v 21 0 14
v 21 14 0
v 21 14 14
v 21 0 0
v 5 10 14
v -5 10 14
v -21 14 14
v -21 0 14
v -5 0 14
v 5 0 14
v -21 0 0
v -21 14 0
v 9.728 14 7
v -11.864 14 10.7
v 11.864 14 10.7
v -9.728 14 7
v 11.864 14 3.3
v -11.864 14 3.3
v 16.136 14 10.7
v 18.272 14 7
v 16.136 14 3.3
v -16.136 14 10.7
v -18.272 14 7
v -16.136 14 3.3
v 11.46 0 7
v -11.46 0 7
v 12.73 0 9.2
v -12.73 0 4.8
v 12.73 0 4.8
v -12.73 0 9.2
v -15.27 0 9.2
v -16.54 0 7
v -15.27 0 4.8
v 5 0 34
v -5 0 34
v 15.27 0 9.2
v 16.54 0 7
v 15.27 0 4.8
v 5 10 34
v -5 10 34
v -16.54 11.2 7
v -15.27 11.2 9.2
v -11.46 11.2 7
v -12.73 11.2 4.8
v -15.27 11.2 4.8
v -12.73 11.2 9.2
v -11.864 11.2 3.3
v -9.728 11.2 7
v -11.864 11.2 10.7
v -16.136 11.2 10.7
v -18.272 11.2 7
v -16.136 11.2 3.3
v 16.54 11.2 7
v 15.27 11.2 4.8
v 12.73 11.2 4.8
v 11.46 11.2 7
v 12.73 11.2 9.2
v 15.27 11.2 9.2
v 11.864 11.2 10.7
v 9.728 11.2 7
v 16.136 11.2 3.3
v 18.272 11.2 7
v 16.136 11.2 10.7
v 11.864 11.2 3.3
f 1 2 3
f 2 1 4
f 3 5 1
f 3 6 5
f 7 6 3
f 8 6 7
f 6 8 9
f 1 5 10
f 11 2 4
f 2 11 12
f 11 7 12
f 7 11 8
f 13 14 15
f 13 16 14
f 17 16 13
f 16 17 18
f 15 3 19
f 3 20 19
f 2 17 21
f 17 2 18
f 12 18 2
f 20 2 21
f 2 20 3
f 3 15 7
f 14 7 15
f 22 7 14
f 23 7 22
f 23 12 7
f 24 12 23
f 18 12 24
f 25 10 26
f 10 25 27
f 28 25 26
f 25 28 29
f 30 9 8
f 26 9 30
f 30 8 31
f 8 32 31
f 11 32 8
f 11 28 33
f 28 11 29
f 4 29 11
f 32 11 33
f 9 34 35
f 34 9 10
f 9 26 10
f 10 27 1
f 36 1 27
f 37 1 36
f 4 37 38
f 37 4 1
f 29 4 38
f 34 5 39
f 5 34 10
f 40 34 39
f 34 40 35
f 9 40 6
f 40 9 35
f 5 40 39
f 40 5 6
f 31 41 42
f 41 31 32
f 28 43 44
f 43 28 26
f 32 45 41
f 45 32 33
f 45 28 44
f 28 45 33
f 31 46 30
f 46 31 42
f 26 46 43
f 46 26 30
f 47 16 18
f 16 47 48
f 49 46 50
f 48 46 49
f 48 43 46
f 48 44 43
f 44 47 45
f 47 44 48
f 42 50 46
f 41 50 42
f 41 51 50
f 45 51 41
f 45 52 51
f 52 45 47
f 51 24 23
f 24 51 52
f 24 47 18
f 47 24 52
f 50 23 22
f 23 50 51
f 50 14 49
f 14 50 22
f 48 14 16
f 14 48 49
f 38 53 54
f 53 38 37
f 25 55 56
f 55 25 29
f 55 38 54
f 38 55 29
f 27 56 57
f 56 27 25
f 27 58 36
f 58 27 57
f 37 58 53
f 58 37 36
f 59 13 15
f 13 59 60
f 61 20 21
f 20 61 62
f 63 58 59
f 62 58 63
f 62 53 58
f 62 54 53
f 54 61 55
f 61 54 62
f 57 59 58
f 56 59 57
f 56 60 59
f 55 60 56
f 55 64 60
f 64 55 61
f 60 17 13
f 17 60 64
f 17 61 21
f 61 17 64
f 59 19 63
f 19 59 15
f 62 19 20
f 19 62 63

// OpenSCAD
// file: ../../../modules/steel_rack.scad
use <bolts.scad>;

bolt_edge_offset = 15;
bolt_positions = [
  bolt_edge_offset,
  bolt_edge_offset + 98,
  bolt_edge_offset + 98 + 24,
];

module bolt_and_nut(y, h) {
  nut_thickness = 5;
  translate([0, y, h / 2])
    m6_bolt_hole(h + 1, center = true);
  translate([0, y, h - nut_thickness / 2])
    rotate([0, 0, 90])
    m6_nut_trap(nut_thickness, center = true);
}

module long_bar(w, y, h) {
  difference() {
    translate([w / 2, y / 2, h / 2])
      cube([w, y, h], center = true);

    for (x = bolt_positions) {
      translate([x, 0, 0])
        bolt_and_nut(y / 2, h);
    }
  }
}

module short_bar(w, y, h) {
  difference() {
    translate([w / 2, y / 2, h / 2])
      cube([w, y, h], center = true);

    translate([bolt_positions[0], 0, 0])
      bolt_and_nut(y / 2, h);
  }
}

module fillet_profile(r, h) {
  linear_extrude(height = h, center = true)
    difference() {
      square([r, r]);
      circle(r = r, $fn = 64);
    }
}
// file: ../../../modules/bolts.scad
module nut_trap(d, h, center = true) {
  linear_extrude(height = h, center = center)
  circle(d = d / cos(30), $fn = 6);
}

module bolt_hole(d, h, center = true) {
  linear_extrude(height = h, center = center)
  circle(d = d, $fn = 64);
}

// Hex holes for self-tapping (nominal - 0.2mm)
module hex_hole(flat_d, h) {
  linear_extrude(height = h, center = true)
  circle(d = flat_d / cos(30), $fn = 6);
}

module m3_bolt_hexhole(h) {
  rotate([0, 0, 90]) hex_hole(flat_d = 2.8, h = h);
}

module m4_bolt_hexhole(h) {
  rotate([0, 0, 90]) hex_hole(flat_d = 3.8, h = h);
}

module m6_bolt_hexhole(h) {
  rotate([0, 0, 90]) hex_hole(flat_d = 5.8, h = h);
}

module m8_bolt_hexhole(h) {
  rotate([0, 0, 90]) hex_hole(flat_d = 7.8, h = h);
}

// M3
module m3_bolt_hole(h, center = false) { bolt_hole(d = 3.4, h = h, center = center); }
module m3_nut_trap(h, center = false) { nut_trap(d = 5.7, h = h, center = center); }

// M4
module m4_bolt_hole(h, center = false) { bolt_hole(d = 4.4, h = h, center = center); }
module m4_nut_trap(h, center = false) { nut_trap(d = 7.5, h = h, center = center); }

// M6
module m6_bolt_hole(h, center = false) { bolt_hole(d = 6.2, h = h, center = center); }
module m6_nut_trap(h, center = false) { nut_trap(d = 10.2, h = h, center = center); }

// M8
module m8_bolt_hole(h, center = false) { bolt_hole(d = 8.4, h = h, center = center); }
module m8_nut_trap(h, center = false) { nut_trap(d = 13.3, h = h, center = center); }
// file: ../../../modules/slide_rail_outer_bracket.scad
use <bolts.scad>
use <steel_rack.scad>

// スライドレール外側とL字アングルを接合するL字ブラケット。
// 設計の経緯と確定値は ledger/designs/steel-rack-500x400.md が正本。
//
// 座標系 (部品自身の datum):
//   X = 0 がこの部品側のL字アングル外側面。部品はアングル板厚の内側から始まる
//   Y = 0 がスライドレール外側面。+Y がラック外側
//   Z = 0 が部品底面 (レール下端と一致)
// front は screw_x = [37, 101.5]、rear は [79.5, 176] を自分の datum
// から渡す。 M6 が高さ 22.5±12 の対称配置のため部品は Z 反転対称になり、
// 左右のレールにも上下反転するだけで同じ2部品を使い回せる。

bracket_height = 45;
flange_t = 10; // 短辺 (X方向厚) の厚さ
// 長辺 (Y方向厚) の厚さ。旧断面は flange_t=10 を共用していたが、レール面を
// rail_offset 分外へ出すと M6 ナット挿入口が長辺と重なるため 2mm 削った
// (10→8、user決定)。ナット六角の内縁 (y=8.000) と長辺外面がツライチになる
arm_t = 8;
// レール接触面のラック外側オフセット。組付け実測でレール間隔が 385mm しか
// なくケース 412mm が入らないため、(412 - 385) / 2 + 0.5 = 14mm ずつ
// 各レールを外側へ移す (user指示)。M6 実穴は既に開いており位置を変えられない
rail_offset = 14;
inner_r = 4;
m6_z = [ 10.5, 34.5 ];
// クリアランス基準: 呼び寸法 + 0.4mm (実プリントの嵌合結果から拡大)
m6_pass_flat = 6.4; // M6ボルト通し六角の二面幅 (手前5mm)
m6_nut_flat = 10.4; // M6ナット窪み六角の二面幅 (奥5mm、ナット実測9.8 + 実効0.6)
m6_stage_depth = 5;
screw_z = 22.5;
m4_pass_flat = 4.4; // M4小トラスネジ通し六角の二面幅
m4_nut_flat = 7.4; // M4ナット窪み六角の二面幅 (ナット実測6.8 + 実効0.6)
m4_nut_depth = 2.8; // M4ナット窪みの深さ (user指定)
edge_margin = 8; // 穴の外縁から部品端までの余白 (自由な辺のみ)
angle_t = 2.2; // L字アングルの板厚

// 六角プリズム: 軸X・上下の辺が水平 (flat-up)。
// 天井を短い水平ブリッジにして垂れの改善を狙う
// (point-up だと天井面が水平から30°になり垂れた — 嵌合試験で確認済み)
module
hex_x_flat_up(flat_d, l)
{
    rotate([ 0, 90, 0 ]) rotate([ 0, 0, 90 ]) hex_hole(flat_d = flat_d, h = l);
}

// 六角プリズム: 軸Y・上下の辺が水平 (flat-up)。M6と同じくブリッジ天井
module
hex_y_flat_up(flat_d, l)
{
    rotate([ 90, 0, 0 ]) hex_hole(flat_d = flat_d, h = l);
}

module
slide_rail_outer_bracket(screw_x, name = "bracket")
{
    // flat-up配置では水平方向の穴半径は対角/2 (= 二面幅/(2*cos30))。
    // 8mm余白の契約はこの実半径に対して守る
    m6_nut_diag = m6_nut_flat / cos(30);
    m4_nut_diag = m4_nut_flat / cos(30);
    // M6中心: 実物のアングルには旧断面 (長辺厚10) の導出値
    // (厚10 + 内側R + 余白 + M6六角対角/2 = 28.0044) で既に穴が開いている。
    // 旧導出式から rail_offset を引くことで M6 実穴と部品外端の絶対位置を
    // 保ったまま、レール接触面 (y=0) だけをラック外側へ 14mm 出す
    m6_y = flange_t + inner_r + edge_margin + m6_nut_diag / 2 - rail_offset;
    short_len = m6_y + m6_nut_diag / 2 + edge_margin;
    // 長辺のX終端: 最奥のM4穴の最大断面 (ナット窪みの対角の半分) + 余白
    arm_end = max(screw_x) + m4_nut_diag / 2 + edge_margin;

    echo(str("CONTRACT ", name, ": height = ", bracket_height));
    echo(str("CONTRACT ", name, ": flange_t = ", flange_t));
    echo(str("CONTRACT ", name, ": arm_t = ", arm_t));
    echo(str("CONTRACT ", name, ": rail_offset = ", rail_offset));
    echo(str("CONTRACT ", name, ": inner_r = ", inner_r));
    echo(str("CONTRACT ", name, ": m6_z = ", m6_z));
    echo(str("CONTRACT ", name, ": m6_pass_flat = ", m6_pass_flat));
    echo(str("CONTRACT ", name, ": m6_nut_flat = ", m6_nut_flat));
    echo(str("CONTRACT ", name, ": screw_z = ", screw_z));
    echo(str("CONTRACT ", name, ": m4_pass_flat = ", m4_pass_flat));
    echo(str("CONTRACT ", name, ": m4_nut_flat = ", m4_nut_flat));
    echo(str("CONTRACT ", name, ": m4_nut_depth = ", m4_nut_depth));
    echo(str("CONTRACT ", name, ": edge_margin = ", edge_margin));
    echo(str("CONTRACT ", name, ": angle_t = ", angle_t));
    echo(str("CONTRACT ", name, ": screw_x = ", screw_x));
    echo(str("CONTRACT ",
             name,
             ": m6_y = ",
             m6_y,
             ", short_len = ",
             short_len,
             ", arm_end = ",
             arm_end));

    // 余白の契約 (自由な辺のみ。高さ45とM6のZはuser固定値なので対象外)。
    // M6ナット六角の内縁 (m6_y - 対角/2 = 8.000) は長辺外面 (y = arm_t) と
    // ツライチで、ナット挿入口が長辺に塞がれない (1e-9 は浮動小数の丸め猶予)
    assert(m6_y - m6_nut_diag / 2 >= arm_t - 1e-9,
           "M6 nut slot is blocked by the arm");
    assert(short_len - (m6_y + m6_nut_diag / 2) >= edge_margin,
           "M6 hole too close to the short-flange edge");
    assert(arm_end - (max(screw_x) + m4_nut_diag / 2) >= edge_margin,
           "M4 hole too close to the arm end");
    assert(min(screw_x) - m4_nut_diag / 2 >= angle_t + flange_t,
           "M4 hole overlaps the short flange");

    difference()
    {
        union()
        {
            // 短辺: アングル内側に当たる縦板 (M6で締結)
            translate([ angle_t, 0, 0 ])
                cube([ flange_t, short_len, bracket_height ]);

            // 長辺: レール外側面に当たる横板 (M4小トラスネジ+ナットで締結)
            translate([ angle_t, 0, 0 ])
                cube([ arm_end - angle_t, arm_t, bracket_height ]);

            // 内側コーナーのR4フィレット (応力集中の回避)
            translate([
                angle_t + flange_t + inner_r,
                arm_t + inner_r,
                bracket_height / 2
            ]) rotate([ 0, 0, 180 ]) fillet_profile(inner_r, bracket_height);
        }

        // M6の2段六角穴 (軸X・flat-up): 手前5mmが通し、奥5mmがナット窪み。
        // ナット窪みは +X へ延長した挿入回廊 (x=7.2..17): 短辺の背面から
        // fillet の掛かる区間を局所カットし、fillet 外端 (x=16.2) を 0.8mm
        // 超えて開放することで M6 ナットを +X 側から真っ直ぐ挿入できる
        // (fillet と挿入経路の干渉分を削るのは user 許容)。
        // 六角の下頂点 (y=8.000) は長辺外面とツライチで、正確な接触は
        // 退化した稜 (非多様体STL) を作るため、hull で 0.2mm 下へ掃引して
        // 長辺外面に浅い逃げ溝を彫る (ナットの嵌合には影響しない)
        slot_start = angle_t + flange_t - m6_stage_depth;
        slot_end = angle_t + flange_t + inner_r + 0.8;
        slot_relief = 0.2;
        for (z = m6_z) {
            translate([ angle_t + m6_stage_depth / 2 - 0.05, m6_y, z ])
                hex_x_flat_up(m6_pass_flat, m6_stage_depth + 0.1);
            translate([ (slot_start + slot_end) / 2, m6_y, z ]) hull()
            {
                hex_x_flat_up(m6_nut_flat, slot_end - slot_start);
                translate([ 0, -slot_relief, 0 ])
                    hex_x_flat_up(m6_nut_flat, slot_end - slot_start);
            }
        }

        // M4小トラスネジの穴 (軸Y・flat-up):
        // 通しは全厚を貫通し、L字の内側面 (y=8) から深さ2.8mmのナット窪み。
        // ネジはレール内側から刺さり
        // (トラス頭はスライダーと干渉しない実測済み)、
        // ナットが窪みの底で受けてレール板とブラケットを共締めする
        for (x = screw_x) {
            translate([ x, arm_t / 2, screw_z ])
                hex_y_flat_up(m4_pass_flat, arm_t + 0.2);
            translate([ x, arm_t - m4_nut_depth / 2 + 0.05, screw_z ])
                hex_y_flat_up(m4_nut_flat, m4_nut_depth + 0.1);
        }
    }
}
// file: ../../../modules/slide_rail_inner_block.scad
use <slide_rail_outer_bracket.scad>

// スライドレール内側とオープンフレームケースを繋ぐ支持部品の共通形状。
// 設計の経緯と確定値は ledger/designs/steel-rack-500x400.md が正本。
//
// 座標系 (部品自身の datum):
//   X = レール方向。M4 2穴の中点 (ブロック中心) が 0
//   Y = 0 がスライドレール(内)の接触面。+Y がラック中央 (ケース) 向き
//   Z = 0 がブロック底面
// レール(内)は高さ24.4mmで、そのド真ん中 (12.2mm) に横穴が28mm間隔で並ぶ。
// ブロックは穴中心 (部品 z = 7) で取り付くため、下端はレール下端から
// 約5.2mm浮く。ブロックの上に立つ10×10の柱でケースを浮かせて受ける。
//
// 印刷向き: ブロックを底面 (z=0) でビルドプレートへ置く。M4軸は水平になり、
// 六角穴はすべて flat-up (天井が短い水平ブリッジ) で外側ブラケットと揃う。

block_len = 42;    // X: 穴間28 + 14
block_depth = 14;  // Y
block_height = 14; // Z
m4_dx = 14;        // ブロック中心から各M4穴まで (間隔28)
m4_z = 7; // ブロック中心の高さ。レール横穴の12.2mmに合わせて付く
// クリアランス基準は外側ブラケットの実績値をそのまま流用する
// (呼び寸法+0.4 / ナットは実測+実効0.6。2026-08-14のuser指示)
m4_pass_flat = 4.4; // M4小トラスネジ通し六角の二面幅
m4_nut_flat = 7.4; // M4ナット窪み六角の二面幅 (ナット実測6.8 + 実効0.6)
m4_nut_depth = 2.8;   // M4ナット窪みの深さ
standoff = 10;        // 柱の一辺 (10×10)
standoff_height = 34; // 柱の全高 = ブロック14 + 上へ20突出

// standoff_offset: 柱の中心をブロック中心からずらす量 (X)。
// 対称型は 0 で X 鏡像不変になり、奥用はケース端との2mm逃げから +14。
// 導出 (ケース端の datum を持つのは entry 側) は各 entry のコメントを参照
module
slide_rail_inner_block(standoff_offset = 0, name = "inner")
{
    // flat-up配置では水平方向の穴半径は対角/2 (= 二面幅/(2*cos30))
    m4_nut_diag = m4_nut_flat / cos(30);

    echo(str("CONTRACT ",
             name,
             ": block = ",
             [ block_len, block_depth, block_height ]));
    echo(str("CONTRACT ", name, ": m4_x = ", [ -m4_dx, m4_dx ]));
    echo(str("CONTRACT ", name, ": m4_z = ", m4_z));
    echo(str("CONTRACT ", name, ": m4_pass_flat = ", m4_pass_flat));
    echo(str("CONTRACT ", name, ": m4_nut_flat = ", m4_nut_flat));
    echo(str("CONTRACT ", name, ": m4_nut_depth = ", m4_nut_depth));
    echo(str("CONTRACT ", name, ": standoff_offset = ", standoff_offset));
    echo(str("CONTRACT ",
             name,
             ": standoff = ",
             [ standoff, standoff, standoff_height ]));

    // 穴と窪みがブロックに収まる契約 (1e-9 は浮動小数の丸め猶予)
    assert(m4_dx + m4_nut_diag / 2 <= block_len / 2 + 1e-9,
           "M4 nut pocket runs past the block end");
    assert(m4_z - m4_nut_flat / 2 >= -1e-9 &&
               m4_z + m4_nut_flat / 2 <= block_height + 1e-9,
           "M4 nut pocket runs past the block top/bottom");
    assert(m4_nut_depth < block_depth,
           "M4 nut pocket is deeper than the block");
    // 柱がブロックのX範囲に収まる契約 (奥用の偏心で端から出ない)
    assert(abs(standoff_offset) + standoff / 2 <= block_len / 2 + 1e-9,
           "standoff runs past the block end");
    assert(standoff <= block_depth, "standoff is deeper than the block");

    difference()
    {
        union()
        {
            // ネジ穴ブロック: レール(内)の側面へ当てて共締めする本体
            translate([ -block_len / 2, 0, 0 ])
                cube([ block_len, block_depth, block_height ]);

            // スタンドオフ: ケースを浮かせて受ける柱。レール接触面
            // (y=0) とツライチで、ブロックより20mm高い
            translate([ standoff_offset - standoff / 2, 0, 0 ])
                cube([ standoff, standoff, standoff_height ]);
        }

        // M4小トラスネジの穴 (軸Y・flat-up): 外側ブラケットと同じ向きで、
        // 通しはレール側 (y=0) から全厚を貫通し、終わり際 (y=14の面) に
        // 深さ2.8mmのナット窪み。ネジはレール内側から刺さり、ナットが
        // 窪みの底で受けてレール板とブロックを共締めする
        for (x = [ -m4_dx, m4_dx ]) {
            translate([ x, block_depth / 2, m4_z ])
                hex_y_flat_up(m4_pass_flat, block_depth + 0.2);
            translate([ x, block_depth - m4_nut_depth / 2 + 0.05, m4_z ])
                hex_y_flat_up(m4_nut_flat, m4_nut_depth + 0.1);
        }
    }
}
// main file
use <../../../modules/slide_rail_inner_block.scad>

// スライドレール内側のケース支持部品 (対称型)。
// datum: X=0 は使う穴ペア (28mm間隔) の中点。Y=0 がレール(内)の接触面。
// 印刷向き: ブロック底面をビルドプレートへ置く (M4軸は水平・六角は flat-up)。
//
// スタンドオフがブロック中心にあり X 鏡像不変のため、この1設計で
// 手前L/R・中央L/R の4個を印刷して使い回せる (ミラー印刷不要)。
// 奥用だけは偏心が対称性を破るため別設計 (slide_rail_inner_rear_{l,r}.scad)。
//
// 手前位置での裏取り: 手前ペア (レール手前端から32/60mm) の中点は46mmで、
// ケース端39mm + 柱の逃げ2mm + 柱の半分5mm = 46mm と一致する。
// つまり偏心0のまま、柱のケース側の面がレール端から41mmに来る

standoff_offset = 0;

slide_rail_inner_block(standoff_offset = standoff_offset,
                       name = "inner_support");
